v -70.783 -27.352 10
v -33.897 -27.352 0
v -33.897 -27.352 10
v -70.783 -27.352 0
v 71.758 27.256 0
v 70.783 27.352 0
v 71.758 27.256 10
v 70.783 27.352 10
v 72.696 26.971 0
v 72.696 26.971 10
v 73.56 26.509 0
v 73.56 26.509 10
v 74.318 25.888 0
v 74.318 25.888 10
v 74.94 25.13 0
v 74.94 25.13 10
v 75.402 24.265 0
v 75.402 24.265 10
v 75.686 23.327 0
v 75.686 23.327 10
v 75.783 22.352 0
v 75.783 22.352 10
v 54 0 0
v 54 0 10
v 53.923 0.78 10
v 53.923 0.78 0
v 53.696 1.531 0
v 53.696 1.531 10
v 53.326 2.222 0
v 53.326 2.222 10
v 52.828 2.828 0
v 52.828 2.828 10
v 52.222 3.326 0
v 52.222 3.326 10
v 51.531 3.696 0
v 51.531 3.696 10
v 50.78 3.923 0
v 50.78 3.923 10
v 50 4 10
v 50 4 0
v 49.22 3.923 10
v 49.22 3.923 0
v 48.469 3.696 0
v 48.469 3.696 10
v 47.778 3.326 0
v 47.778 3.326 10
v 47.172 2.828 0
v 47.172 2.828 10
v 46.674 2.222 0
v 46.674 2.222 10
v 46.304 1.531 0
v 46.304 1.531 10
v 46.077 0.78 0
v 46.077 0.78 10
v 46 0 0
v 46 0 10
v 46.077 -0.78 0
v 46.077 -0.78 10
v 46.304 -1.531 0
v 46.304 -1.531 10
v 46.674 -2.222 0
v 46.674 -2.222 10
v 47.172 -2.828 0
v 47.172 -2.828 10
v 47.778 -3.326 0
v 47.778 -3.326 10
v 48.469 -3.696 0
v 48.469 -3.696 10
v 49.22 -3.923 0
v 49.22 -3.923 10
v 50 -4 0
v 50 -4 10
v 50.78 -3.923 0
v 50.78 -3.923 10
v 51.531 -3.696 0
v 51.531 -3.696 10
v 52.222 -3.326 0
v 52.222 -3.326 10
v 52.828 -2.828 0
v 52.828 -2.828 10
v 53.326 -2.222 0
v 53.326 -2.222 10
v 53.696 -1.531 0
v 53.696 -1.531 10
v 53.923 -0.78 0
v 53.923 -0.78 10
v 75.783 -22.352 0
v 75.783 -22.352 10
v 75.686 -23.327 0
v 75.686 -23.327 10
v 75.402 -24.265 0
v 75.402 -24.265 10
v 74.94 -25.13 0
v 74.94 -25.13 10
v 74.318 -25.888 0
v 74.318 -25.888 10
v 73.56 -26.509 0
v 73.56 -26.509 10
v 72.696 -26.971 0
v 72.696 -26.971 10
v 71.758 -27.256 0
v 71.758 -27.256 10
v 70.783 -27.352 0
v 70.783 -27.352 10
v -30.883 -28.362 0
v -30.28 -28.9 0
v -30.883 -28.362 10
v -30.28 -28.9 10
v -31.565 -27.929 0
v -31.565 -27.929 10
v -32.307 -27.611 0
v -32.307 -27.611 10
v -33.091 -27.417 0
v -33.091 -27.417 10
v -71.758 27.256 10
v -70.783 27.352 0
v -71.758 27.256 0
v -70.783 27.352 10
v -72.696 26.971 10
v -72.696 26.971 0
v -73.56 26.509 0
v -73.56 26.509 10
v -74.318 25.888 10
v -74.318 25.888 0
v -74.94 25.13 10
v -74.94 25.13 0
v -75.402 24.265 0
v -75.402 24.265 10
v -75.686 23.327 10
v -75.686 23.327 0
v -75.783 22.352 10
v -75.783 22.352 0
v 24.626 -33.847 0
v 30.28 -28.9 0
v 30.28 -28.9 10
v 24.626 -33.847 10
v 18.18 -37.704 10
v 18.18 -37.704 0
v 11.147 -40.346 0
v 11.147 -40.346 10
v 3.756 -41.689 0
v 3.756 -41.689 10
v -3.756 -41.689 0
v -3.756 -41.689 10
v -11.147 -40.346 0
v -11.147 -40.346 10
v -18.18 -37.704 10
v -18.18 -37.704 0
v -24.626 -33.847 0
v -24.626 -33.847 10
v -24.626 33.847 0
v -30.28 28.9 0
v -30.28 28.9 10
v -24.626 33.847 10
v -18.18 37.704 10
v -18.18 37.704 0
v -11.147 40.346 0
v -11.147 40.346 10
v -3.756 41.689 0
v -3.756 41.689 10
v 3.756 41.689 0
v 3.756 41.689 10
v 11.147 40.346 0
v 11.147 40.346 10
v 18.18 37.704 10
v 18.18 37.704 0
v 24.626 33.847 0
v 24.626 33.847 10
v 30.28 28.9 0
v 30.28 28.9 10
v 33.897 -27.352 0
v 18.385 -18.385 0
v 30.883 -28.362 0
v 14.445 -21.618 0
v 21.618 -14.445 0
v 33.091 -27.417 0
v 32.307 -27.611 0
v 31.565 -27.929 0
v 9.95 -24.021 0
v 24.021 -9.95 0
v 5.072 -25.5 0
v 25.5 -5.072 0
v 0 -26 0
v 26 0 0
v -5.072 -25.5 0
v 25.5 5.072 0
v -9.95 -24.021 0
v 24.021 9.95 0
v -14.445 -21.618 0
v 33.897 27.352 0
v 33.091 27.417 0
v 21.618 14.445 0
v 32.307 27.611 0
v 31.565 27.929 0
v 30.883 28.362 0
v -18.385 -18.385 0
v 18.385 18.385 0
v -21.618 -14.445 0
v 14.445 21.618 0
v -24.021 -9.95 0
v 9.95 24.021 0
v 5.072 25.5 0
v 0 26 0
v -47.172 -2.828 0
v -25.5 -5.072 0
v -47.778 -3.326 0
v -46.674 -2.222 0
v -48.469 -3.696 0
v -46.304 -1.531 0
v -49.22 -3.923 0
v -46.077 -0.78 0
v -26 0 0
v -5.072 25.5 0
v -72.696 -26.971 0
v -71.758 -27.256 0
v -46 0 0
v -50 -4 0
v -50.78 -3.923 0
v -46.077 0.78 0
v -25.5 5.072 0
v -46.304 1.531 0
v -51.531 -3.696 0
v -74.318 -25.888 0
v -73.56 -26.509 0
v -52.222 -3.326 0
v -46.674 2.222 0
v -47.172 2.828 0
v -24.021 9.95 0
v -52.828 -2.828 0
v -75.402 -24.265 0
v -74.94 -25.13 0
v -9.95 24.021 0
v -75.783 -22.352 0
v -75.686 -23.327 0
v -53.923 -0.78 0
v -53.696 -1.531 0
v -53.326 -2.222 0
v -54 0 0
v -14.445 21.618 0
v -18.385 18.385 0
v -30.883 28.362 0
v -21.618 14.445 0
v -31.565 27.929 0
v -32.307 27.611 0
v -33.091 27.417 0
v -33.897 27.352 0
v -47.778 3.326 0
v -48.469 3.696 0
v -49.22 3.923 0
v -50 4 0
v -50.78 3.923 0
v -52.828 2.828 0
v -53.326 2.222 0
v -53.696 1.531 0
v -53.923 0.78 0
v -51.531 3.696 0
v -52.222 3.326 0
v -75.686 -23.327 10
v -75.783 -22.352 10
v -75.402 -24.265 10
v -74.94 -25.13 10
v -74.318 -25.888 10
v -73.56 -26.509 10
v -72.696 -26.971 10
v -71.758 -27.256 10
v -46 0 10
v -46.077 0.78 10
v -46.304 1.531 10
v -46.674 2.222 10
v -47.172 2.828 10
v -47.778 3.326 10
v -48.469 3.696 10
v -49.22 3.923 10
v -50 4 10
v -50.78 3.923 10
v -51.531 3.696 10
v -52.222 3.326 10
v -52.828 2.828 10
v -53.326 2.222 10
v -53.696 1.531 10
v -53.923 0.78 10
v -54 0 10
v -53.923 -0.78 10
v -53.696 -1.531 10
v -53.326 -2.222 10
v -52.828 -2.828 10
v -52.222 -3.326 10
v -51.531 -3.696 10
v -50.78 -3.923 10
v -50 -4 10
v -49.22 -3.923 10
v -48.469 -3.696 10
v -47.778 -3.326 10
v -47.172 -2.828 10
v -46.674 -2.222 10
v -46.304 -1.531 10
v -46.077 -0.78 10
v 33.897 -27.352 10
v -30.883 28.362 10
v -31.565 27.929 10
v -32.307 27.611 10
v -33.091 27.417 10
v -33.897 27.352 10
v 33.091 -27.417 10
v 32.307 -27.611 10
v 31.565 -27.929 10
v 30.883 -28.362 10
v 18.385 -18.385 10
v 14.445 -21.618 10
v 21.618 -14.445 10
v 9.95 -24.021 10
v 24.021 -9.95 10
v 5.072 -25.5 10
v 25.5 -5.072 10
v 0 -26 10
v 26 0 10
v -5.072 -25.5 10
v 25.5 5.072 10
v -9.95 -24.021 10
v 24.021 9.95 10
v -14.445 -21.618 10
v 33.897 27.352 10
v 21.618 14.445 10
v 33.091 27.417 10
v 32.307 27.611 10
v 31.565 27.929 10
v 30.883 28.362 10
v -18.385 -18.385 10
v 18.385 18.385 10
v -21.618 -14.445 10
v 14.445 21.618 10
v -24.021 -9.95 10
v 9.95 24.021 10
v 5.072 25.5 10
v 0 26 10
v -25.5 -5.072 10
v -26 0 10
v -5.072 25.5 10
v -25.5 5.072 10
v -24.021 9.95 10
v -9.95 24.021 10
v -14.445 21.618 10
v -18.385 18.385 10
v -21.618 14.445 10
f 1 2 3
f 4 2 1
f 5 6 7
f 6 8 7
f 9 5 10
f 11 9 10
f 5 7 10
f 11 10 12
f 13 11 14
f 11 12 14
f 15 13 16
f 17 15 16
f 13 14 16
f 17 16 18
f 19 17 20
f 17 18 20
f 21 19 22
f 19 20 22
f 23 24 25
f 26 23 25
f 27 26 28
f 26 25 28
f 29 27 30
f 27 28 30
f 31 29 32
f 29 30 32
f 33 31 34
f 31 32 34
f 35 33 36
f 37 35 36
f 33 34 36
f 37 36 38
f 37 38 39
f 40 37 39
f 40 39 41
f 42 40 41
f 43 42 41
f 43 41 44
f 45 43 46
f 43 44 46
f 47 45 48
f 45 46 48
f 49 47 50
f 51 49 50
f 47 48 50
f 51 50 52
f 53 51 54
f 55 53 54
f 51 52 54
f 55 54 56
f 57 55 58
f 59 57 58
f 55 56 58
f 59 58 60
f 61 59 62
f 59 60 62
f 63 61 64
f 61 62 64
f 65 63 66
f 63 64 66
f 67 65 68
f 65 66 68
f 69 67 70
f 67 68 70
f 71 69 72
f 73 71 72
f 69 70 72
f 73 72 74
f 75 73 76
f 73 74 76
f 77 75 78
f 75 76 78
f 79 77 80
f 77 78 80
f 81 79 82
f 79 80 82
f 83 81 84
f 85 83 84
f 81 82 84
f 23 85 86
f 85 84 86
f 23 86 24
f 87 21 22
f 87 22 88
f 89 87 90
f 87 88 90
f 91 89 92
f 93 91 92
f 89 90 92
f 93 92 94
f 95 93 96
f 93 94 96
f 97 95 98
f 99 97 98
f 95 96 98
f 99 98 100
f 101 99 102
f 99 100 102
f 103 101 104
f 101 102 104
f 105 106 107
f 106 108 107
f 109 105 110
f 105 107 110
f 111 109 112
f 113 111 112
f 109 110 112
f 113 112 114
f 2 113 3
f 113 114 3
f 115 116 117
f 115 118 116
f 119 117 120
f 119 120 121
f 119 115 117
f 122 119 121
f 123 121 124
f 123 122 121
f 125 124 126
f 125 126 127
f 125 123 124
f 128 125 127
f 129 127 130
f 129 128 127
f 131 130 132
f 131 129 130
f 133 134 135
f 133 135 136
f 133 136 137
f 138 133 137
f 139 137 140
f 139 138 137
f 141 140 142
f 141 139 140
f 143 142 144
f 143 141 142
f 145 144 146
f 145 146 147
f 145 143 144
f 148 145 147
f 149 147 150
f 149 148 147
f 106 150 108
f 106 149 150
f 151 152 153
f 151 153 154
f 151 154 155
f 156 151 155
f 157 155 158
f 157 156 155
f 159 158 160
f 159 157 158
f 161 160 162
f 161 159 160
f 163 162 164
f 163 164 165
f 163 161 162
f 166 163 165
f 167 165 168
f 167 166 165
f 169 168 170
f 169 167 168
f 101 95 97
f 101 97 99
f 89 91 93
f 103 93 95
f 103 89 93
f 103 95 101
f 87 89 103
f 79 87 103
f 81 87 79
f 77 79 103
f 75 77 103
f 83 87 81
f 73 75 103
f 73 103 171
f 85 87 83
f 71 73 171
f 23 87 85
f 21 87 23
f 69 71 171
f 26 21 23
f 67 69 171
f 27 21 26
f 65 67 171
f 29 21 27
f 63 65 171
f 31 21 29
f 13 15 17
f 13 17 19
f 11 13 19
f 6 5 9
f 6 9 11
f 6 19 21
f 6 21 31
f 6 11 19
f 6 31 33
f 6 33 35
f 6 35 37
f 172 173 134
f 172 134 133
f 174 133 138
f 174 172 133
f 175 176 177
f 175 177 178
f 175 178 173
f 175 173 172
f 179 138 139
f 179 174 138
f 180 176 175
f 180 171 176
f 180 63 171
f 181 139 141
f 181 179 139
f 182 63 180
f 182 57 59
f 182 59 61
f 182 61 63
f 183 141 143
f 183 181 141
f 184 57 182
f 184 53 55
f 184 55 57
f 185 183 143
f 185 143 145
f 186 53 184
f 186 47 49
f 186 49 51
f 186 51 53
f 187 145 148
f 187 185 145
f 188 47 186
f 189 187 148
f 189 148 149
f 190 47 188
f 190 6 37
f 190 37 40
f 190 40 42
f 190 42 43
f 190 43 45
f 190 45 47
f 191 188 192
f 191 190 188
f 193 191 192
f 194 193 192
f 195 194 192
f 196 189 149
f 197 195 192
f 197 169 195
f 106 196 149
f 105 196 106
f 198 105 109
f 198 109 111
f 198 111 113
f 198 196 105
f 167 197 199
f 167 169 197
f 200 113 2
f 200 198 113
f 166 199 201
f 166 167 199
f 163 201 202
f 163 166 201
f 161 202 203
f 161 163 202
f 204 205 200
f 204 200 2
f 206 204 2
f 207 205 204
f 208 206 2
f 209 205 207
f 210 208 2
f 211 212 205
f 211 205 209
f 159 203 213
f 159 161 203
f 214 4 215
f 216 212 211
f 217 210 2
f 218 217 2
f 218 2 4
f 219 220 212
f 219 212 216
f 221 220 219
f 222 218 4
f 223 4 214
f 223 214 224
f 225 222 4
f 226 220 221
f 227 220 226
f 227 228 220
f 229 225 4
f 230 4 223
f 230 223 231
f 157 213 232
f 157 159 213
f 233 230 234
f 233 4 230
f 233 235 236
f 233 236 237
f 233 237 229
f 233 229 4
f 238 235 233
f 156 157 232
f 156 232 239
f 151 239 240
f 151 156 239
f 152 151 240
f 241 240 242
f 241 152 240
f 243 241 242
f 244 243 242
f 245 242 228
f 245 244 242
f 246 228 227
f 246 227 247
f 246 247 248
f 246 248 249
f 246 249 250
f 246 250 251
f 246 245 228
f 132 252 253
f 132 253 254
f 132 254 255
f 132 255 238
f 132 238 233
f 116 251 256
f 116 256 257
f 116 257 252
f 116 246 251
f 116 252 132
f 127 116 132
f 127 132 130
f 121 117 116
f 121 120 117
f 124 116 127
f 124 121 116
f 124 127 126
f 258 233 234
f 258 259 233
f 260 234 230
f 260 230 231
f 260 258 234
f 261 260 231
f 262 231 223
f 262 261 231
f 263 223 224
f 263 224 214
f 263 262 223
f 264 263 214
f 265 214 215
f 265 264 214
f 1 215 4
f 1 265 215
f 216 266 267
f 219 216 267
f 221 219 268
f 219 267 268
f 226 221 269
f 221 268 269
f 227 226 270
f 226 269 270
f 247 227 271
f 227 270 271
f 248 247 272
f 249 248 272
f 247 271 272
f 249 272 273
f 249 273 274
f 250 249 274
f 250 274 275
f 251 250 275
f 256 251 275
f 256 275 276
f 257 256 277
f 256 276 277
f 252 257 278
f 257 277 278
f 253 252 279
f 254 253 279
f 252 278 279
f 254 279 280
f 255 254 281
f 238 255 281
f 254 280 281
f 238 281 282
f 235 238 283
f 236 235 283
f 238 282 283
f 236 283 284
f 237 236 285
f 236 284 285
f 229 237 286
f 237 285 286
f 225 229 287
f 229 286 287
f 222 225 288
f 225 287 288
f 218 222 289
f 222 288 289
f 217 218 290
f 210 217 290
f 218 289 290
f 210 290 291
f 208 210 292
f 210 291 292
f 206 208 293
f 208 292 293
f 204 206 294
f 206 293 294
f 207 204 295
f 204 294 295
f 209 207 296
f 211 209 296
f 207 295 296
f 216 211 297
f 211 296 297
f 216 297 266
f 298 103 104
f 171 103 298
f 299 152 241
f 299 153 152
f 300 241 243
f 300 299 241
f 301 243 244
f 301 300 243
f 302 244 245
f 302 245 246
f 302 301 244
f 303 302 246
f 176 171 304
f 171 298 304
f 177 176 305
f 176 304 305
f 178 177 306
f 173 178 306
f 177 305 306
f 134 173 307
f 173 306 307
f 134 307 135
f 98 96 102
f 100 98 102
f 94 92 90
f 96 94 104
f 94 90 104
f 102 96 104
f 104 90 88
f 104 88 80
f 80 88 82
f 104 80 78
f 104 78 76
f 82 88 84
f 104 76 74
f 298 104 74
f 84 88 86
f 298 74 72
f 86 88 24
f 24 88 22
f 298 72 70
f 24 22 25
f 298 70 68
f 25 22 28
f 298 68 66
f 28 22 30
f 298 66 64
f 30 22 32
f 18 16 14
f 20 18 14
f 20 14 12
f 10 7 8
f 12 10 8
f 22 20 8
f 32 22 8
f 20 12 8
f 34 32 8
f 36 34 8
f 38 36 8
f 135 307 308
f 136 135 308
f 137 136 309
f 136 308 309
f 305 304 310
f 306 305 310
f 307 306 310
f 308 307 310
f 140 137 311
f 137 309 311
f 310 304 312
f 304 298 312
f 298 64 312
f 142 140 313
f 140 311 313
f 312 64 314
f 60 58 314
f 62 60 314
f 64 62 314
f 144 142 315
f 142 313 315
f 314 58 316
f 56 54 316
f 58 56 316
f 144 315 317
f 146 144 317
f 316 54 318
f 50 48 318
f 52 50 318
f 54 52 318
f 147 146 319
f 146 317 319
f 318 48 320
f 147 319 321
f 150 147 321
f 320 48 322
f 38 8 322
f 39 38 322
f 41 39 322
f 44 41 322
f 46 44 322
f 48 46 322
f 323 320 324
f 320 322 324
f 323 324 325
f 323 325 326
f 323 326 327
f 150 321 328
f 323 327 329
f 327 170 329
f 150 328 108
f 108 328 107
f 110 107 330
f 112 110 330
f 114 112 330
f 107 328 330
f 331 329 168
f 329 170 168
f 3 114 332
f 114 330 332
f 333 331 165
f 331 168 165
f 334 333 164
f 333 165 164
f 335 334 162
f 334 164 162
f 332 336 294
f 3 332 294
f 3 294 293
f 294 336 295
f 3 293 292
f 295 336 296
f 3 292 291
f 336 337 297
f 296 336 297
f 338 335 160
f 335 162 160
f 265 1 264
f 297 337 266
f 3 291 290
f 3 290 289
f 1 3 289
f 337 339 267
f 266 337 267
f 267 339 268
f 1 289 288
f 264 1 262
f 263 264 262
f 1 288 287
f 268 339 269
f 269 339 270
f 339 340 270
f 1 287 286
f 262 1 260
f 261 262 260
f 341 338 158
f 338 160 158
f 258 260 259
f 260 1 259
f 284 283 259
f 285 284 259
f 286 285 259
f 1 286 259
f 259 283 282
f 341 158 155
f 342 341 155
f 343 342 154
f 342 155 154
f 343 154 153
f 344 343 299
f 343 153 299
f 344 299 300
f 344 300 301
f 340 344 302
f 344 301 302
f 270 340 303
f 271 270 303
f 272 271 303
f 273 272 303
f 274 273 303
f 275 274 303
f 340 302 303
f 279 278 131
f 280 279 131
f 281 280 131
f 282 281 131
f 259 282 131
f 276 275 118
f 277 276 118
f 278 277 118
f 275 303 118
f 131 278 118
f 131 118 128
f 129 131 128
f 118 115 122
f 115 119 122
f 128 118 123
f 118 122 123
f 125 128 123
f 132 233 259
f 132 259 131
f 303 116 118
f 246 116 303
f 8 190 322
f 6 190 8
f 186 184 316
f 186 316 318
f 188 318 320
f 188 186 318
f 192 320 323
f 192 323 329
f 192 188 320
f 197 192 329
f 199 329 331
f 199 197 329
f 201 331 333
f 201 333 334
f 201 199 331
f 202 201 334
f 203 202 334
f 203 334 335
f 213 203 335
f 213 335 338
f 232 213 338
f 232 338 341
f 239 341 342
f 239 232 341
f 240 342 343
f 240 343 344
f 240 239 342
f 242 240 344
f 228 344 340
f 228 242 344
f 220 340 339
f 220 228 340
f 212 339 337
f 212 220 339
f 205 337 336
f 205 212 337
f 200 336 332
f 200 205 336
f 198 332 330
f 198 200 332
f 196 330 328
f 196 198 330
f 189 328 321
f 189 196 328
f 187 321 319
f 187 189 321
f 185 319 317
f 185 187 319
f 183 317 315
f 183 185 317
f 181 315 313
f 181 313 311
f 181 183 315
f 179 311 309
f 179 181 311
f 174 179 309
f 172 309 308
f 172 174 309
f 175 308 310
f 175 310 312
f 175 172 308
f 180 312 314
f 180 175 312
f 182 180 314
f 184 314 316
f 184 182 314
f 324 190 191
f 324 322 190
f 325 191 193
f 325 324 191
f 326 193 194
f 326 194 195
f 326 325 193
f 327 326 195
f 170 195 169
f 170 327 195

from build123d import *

# Parameters (mm, degrees)
SKETCH1_R           = 26
BOSS_EXTRUDE1_DEPTH = 10
FILLET1_R           = 5
SKETCH2_R           = 4
CUT_EXTRUDE1_DEPTH  = 10


with BuildPart() as part:
    # Sketch1 → Boss-Extrude1 (new body)
    with BuildSketch(Plane.XY):
        with BuildLine():
            Line((31.684802474, 27.352044719), (75.782561157, 27.352044719))
            Line((75.782561157, 27.352044719), (75.782561157, -27.352044719))
            Line((75.782561157, -27.352044719), (31.684802474, -27.352044719))
            ThreePointArc((31.684802474, -27.352044719), (0, -41.857628434), (-31.684802474, -27.352044719))
            Line((-31.684802474, -27.352044719), (-75.782561157, -27.352044719))
            Line((-75.782561157, -27.352044719), (-75.782561157, 27.352044719))
            Line((-75.782561157, 27.352044719), (-31.684802474, 27.352044719))
            ThreePointArc((-31.684802474, 27.352044719), (0, 41.857628434), (31.684802474, 27.352044719))
        make_face()
        Circle(SKETCH1_R, mode=Mode.SUBTRACT)
    extrude(amount=BOSS_EXTRUDE1_DEPTH)

    # Fillet1
    fillet1_edges = [part.edges().sort_by_distance(p)[0] for p in [
        (75.782561157, -27.352044719, 5),
        (31.684802474, -27.352044719, 5),
        (-31.684802474, -27.352044719, 5),
        (-75.782561157, -27.352044719, 5),
        (-75.782561157, 27.352044719, 5),
        (-31.684802474, 27.352044719, 5),
        (31.684802474, 27.352044719, 5),
        (75.782561157, 27.352044719, 5),
    ]]
    fillet(fillet1_edges, radius=FILLET1_R)

    # Sketch2 → Cut-Extrude1 (cut)
    with BuildSketch(Plane.XY.offset(10)):
        with Locations((-50, 0)):
            Circle(SKETCH2_R)
        with Locations((50, 0)):
            Circle(SKETCH2_R)
    extrude(amount=-CUT_EXTRUDE1_DEPTH, mode=Mode.SUBTRACT)


solid = part.part
